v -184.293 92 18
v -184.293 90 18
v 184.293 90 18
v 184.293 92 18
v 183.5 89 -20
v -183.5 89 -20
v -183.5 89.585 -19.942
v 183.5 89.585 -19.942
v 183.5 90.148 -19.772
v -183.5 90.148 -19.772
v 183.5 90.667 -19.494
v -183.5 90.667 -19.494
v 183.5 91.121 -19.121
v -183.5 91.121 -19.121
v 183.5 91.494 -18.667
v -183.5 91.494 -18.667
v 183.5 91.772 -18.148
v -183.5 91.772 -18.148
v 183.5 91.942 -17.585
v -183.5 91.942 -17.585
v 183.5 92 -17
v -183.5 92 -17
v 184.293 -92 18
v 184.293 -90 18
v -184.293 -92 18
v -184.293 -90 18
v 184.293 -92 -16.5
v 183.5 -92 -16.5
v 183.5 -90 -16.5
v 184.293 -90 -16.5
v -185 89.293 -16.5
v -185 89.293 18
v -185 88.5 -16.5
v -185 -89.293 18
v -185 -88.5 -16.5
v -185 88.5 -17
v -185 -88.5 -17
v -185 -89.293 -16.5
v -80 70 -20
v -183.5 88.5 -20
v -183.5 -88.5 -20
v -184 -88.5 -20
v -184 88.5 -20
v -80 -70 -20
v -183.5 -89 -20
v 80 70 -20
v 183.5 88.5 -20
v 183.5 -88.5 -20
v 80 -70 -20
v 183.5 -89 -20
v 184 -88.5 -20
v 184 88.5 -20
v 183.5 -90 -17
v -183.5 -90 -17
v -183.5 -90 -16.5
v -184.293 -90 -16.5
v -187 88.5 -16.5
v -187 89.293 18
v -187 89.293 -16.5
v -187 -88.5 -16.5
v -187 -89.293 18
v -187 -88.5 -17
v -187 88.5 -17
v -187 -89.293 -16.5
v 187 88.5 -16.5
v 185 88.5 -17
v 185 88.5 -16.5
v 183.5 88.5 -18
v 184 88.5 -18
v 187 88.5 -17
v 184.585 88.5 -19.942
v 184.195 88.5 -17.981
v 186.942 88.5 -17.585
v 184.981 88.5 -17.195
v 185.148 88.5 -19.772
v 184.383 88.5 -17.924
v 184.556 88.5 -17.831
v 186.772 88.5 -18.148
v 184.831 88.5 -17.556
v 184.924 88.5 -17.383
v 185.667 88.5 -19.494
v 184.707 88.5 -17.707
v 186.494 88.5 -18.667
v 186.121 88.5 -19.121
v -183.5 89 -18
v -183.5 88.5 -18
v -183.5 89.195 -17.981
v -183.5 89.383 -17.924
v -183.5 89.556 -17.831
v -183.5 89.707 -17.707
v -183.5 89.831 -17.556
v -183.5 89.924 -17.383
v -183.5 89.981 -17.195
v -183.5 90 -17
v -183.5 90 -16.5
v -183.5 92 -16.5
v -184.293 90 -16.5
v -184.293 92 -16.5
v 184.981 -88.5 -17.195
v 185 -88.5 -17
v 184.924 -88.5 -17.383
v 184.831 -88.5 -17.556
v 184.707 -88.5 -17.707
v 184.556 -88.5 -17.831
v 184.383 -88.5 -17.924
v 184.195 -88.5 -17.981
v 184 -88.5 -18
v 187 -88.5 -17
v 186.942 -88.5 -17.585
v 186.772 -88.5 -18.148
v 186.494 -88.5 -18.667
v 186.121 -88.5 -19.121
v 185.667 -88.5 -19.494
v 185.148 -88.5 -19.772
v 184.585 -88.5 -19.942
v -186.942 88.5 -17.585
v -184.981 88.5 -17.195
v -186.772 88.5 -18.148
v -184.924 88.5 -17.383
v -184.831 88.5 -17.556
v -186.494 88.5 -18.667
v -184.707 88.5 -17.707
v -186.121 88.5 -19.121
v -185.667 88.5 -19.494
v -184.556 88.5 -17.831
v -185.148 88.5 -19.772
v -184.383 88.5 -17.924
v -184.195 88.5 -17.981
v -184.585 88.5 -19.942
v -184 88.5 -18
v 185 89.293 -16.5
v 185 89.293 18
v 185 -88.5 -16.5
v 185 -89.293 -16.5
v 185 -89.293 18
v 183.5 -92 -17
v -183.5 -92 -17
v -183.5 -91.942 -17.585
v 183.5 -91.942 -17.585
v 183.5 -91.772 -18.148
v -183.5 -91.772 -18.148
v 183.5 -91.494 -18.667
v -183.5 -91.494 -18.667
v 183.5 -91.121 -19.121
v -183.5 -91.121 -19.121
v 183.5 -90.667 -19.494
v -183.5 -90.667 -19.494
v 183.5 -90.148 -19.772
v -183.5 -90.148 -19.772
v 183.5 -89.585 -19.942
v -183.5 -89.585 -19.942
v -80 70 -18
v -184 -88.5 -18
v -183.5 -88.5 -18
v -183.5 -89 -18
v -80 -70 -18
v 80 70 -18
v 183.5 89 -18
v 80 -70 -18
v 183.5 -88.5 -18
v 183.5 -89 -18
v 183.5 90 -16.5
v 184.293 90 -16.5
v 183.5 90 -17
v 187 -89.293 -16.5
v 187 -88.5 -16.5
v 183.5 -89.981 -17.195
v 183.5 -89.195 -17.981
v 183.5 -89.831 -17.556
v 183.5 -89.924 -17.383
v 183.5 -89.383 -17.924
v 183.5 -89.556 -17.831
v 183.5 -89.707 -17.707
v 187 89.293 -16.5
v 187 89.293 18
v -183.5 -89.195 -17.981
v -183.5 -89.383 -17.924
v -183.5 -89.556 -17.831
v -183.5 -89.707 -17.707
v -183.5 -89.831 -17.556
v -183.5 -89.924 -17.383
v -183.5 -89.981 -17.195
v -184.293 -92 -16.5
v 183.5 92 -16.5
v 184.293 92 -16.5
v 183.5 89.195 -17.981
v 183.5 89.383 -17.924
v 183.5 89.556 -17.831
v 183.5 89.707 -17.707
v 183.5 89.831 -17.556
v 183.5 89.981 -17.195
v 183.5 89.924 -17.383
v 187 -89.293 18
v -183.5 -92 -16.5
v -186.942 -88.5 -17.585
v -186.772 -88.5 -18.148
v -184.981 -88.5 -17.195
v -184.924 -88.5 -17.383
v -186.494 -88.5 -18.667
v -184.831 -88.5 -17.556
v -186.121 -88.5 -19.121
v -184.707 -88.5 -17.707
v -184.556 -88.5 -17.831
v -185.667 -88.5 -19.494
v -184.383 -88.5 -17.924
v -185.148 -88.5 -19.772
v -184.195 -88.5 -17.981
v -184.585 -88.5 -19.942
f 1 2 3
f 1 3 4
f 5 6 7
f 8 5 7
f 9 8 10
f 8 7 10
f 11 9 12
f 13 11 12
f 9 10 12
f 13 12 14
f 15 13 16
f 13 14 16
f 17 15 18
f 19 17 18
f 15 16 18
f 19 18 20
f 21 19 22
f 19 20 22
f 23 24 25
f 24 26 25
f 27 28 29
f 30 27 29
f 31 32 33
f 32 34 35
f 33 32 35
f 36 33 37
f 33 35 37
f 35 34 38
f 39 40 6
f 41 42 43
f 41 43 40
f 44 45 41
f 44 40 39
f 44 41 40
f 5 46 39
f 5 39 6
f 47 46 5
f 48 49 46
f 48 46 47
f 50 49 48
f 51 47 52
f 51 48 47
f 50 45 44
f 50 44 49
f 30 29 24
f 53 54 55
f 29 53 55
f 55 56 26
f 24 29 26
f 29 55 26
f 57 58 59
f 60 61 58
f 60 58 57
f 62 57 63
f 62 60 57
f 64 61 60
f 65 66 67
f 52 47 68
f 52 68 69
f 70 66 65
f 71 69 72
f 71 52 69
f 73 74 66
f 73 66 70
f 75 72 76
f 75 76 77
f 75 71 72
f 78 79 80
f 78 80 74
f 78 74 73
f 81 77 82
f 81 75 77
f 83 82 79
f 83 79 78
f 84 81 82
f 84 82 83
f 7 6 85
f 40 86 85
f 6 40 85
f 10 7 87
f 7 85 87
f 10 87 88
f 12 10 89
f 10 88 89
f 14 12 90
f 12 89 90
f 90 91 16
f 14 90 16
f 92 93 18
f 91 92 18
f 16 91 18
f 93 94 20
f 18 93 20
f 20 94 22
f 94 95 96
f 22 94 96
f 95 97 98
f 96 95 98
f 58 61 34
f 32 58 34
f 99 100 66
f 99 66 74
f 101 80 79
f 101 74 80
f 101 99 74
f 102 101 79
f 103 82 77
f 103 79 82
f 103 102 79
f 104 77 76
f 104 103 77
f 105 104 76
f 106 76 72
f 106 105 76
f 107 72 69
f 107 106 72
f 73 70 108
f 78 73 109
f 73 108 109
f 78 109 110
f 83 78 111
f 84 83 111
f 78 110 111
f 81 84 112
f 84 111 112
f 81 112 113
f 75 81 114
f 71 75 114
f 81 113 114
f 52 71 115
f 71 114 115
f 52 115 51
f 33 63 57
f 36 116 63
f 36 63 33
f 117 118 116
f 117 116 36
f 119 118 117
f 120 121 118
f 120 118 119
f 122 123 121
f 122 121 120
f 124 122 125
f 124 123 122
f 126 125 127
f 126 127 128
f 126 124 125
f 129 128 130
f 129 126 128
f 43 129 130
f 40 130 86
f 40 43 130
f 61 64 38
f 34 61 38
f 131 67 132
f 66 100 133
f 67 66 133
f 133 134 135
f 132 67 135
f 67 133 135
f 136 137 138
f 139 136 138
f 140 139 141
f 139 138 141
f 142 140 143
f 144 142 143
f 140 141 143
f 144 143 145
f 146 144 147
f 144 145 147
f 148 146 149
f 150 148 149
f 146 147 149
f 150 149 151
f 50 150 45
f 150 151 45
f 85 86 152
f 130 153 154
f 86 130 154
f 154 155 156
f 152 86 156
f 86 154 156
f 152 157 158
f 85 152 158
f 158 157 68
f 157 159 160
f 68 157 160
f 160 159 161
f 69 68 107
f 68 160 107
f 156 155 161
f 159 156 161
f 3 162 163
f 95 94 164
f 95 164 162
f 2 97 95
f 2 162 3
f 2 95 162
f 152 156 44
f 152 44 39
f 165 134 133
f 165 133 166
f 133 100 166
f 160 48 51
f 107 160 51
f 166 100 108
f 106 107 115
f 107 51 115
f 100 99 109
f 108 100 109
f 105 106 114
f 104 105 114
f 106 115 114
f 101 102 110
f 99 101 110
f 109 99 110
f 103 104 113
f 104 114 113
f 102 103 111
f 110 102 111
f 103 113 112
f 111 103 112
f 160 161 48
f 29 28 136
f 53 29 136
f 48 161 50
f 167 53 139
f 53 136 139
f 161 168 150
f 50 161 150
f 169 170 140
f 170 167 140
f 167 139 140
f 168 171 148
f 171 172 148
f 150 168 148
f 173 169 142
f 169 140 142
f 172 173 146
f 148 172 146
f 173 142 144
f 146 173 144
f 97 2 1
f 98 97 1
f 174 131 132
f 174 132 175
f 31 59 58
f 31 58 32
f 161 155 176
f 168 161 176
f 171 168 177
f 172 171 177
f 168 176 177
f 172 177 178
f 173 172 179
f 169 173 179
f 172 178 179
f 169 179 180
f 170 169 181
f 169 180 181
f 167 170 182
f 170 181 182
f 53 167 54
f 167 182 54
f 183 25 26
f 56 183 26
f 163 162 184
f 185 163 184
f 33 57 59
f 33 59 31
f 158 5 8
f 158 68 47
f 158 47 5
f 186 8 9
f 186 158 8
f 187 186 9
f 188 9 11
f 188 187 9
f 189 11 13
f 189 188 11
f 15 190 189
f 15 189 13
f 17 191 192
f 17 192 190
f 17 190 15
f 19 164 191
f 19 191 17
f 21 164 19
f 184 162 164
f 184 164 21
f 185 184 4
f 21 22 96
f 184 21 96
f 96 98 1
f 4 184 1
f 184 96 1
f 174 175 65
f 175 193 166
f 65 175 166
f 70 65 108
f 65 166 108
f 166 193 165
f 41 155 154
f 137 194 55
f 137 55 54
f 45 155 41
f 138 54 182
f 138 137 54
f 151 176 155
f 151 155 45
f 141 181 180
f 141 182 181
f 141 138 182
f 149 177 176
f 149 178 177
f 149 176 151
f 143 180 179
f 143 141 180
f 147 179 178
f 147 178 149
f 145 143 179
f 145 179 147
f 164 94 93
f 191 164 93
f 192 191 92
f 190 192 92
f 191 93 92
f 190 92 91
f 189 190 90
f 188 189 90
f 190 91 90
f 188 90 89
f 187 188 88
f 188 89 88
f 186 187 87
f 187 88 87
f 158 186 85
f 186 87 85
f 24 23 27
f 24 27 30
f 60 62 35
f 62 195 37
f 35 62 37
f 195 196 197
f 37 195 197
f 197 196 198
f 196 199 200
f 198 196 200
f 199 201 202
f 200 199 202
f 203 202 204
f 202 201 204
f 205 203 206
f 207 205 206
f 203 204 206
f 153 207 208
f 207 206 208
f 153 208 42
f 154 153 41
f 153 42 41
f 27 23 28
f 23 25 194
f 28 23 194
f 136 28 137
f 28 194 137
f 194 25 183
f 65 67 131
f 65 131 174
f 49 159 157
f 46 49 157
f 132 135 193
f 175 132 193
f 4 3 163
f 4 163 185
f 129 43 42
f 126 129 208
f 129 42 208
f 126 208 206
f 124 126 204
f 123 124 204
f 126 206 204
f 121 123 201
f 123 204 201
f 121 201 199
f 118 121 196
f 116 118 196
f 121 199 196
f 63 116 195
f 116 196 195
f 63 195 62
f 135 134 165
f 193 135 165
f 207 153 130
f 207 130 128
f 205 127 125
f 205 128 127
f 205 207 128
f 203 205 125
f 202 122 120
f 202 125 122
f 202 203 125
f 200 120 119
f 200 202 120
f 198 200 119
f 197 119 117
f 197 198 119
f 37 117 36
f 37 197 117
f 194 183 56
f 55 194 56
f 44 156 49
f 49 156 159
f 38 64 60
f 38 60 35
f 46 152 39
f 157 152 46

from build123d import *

# Parameters (mm, degrees)
SKETCH1_W                    = 370
SKETCH1_H                    = 180
BOSS_EXTRUDE1_DEPTH          = 18
CONVERT_SOLID1_START         = -90
CONVERT_SOLID1_DEPTH         = 180
CONVERT_SOLID1_START_2       = -92
CONVERT_SOLID1_2_DEPTH       = 3.5
CONVERT_SOLID1_START_3       = 88.5
CONVERT_SOLID1_3_DEPTH       = 3.5
CONVERT_SOLID1_START_4       = -88.5
CONVERT_SOLID1_4_DEPTH       = 177
CONVERT_SOLID1_START_5       = -89
CONVERT_SOLID1_5_OUTLINE_W   = 367
CONVERT_SOLID1_5_OUTLINE_H   = 2
CONVERT_SOLID1_5_OUTLINE_W_2 = 2
CONVERT_SOLID1_5_OUTLINE_H_2 = 34.5
CONVERT_SOLID1_5_DEPTH       = 178
CONVERT_SOLID1_START_6       = -89.292893219
CONVERT_SOLID1_6_OUTLINE_W   = 2
CONVERT_SOLID1_6_OUTLINE_H   = 34.5
CONVERT_SOLID1_6_DEPTH       = 178.585786438
CONVERT_SOLID1_START_7       = -183.5
CONVERT_SOLID1_7_DEPTH       = 367
CONVERT_SOLID1_START_8       = -184.292893219
CONVERT_SOLID1_8_OUTLINE_W   = 2
CONVERT_SOLID1_8_OUTLINE_H   = 34.5
CONVERT_SOLID1_8_DEPTH       = 368.585786438
SKETCH6_W                    = 160
SKETCH6_H                    = 140
CUT_EXTRUDE1_DEPTH           = 36


with BuildPart() as part:
    # Sketch1 → Boss-Extrude1 (new, symmetric)
    with BuildSketch(Plane.XY):
        Rectangle(SKETCH1_W, SKETCH1_H)
    extrude(amount=BOSS_EXTRUDE1_DEPTH, both=True)

    # Convert-Solid1: read off the stored shape, not the designer's step
    # Convert-Solid1 outline → Convert-Solid1 (cut)
    with BuildSketch(Plane(origin=(0, 0, 0), x_dir=(1, 0, 0), z_dir=(0, 1, 0)).offset(CONVERT_SOLID1_START)):
        with BuildLine():
            ThreePointArc((-184, 18), (-184.707106781, 17.707106781), (-185, 17))
            Line((-185, 17), (-185, -18))
            Line((-185, -18), (185, -18))
            Line((185, -18), (185, 17))
            ThreePointArc((185, 17), (184.707106781, 17.707106781), (184, 18))
            Line((184, 18), (-184, 18))
        make_face()
    extrude(amount=CONVERT_SOLID1_DEPTH, mode=Mode.SUBTRACT)

    # Convert-Solid1 2 outline → Convert-Solid1 2 (cut)
    with BuildSketch(Plane(origin=(0, 0, 0), x_dir=(1, 0, 0), z_dir=(0, 1, 0)).offset(CONVERT_SOLID1_START_2)):
        with BuildLine():
            ThreePointArc((-185, 17), (-184.707106781, 17.707106781), (-184, 18))
            Line((-184, 18), (-185, 18))
            Line((-185, 18), (-185, 17))
        make_face()
        with BuildLine():
            Line((185, 18), (184, 18))
            ThreePointArc((184, 18), (184.707106781, 17.707106781), (185, 17))
            Line((185, 17), (185, 18))
        make_face()
    extrude(amount=CONVERT_SOLID1_2_DEPTH, mode=Mode.SUBTRACT)

    # Convert-Solid1 3 outline → Convert-Solid1 3 (cut)
    with BuildSketch(Plane(origin=(0, 0, 0), x_dir=(1, 0, 0), z_dir=(0, 1, 0)).offset(CONVERT_SOLID1_START_3)):
        with BuildLine():
            ThreePointArc((-185, 17), (-184.707106781, 17.707106781), (-184, 18))
            Line((-184, 18), (-185, 18))
            Line((-185, 18), (-185, 17))
        make_face()
        with BuildLine():
            Line((185, 18), (184, 18))
            ThreePointArc((184, 18), (184.707106781, 17.707106781), (185, 17))
            Line((185, 17), (185, 18))
        make_face()
    extrude(amount=CONVERT_SOLID1_3_DEPTH, mode=Mode.SUBTRACT)

    # Convert-Solid1 4 outline → Convert-Solid1 4 (add)
    with BuildSketch(Plane(origin=(0, 0, 0), x_dir=(1, 0, 0), z_dir=(0, 1, 0)).offset(CONVERT_SOLID1_START_4)):
        with BuildLine():
            Line((185, 18), (185, -18))
            Line((185, -18), (187, -18))
            Line((187, -18), (187, 17))
            ThreePointArc((187, 17), (186.121320344, 19.121320344), (184, 20))
            Line((184, 20), (-184, 20))
            ThreePointArc((-184, 20), (-186.121320344, 19.121320344), (-187, 17))
            Line((-187, 17), (-187, -18))
            Line((-187, -18), (-185, -18))
            Line((-185, -18), (-185, 18))
            Line((-185, 18), (185, 18))
        make_face()
    extrude(amount=CONVERT_SOLID1_4_DEPTH)

    # Convert-Solid1 5 outline → Convert-Solid1 5 (add)
    with BuildSketch(Plane(origin=(0, 0, 0), x_dir=(1, 0, 0), z_dir=(0, 1, 0)).offset(CONVERT_SOLID1_START_5)):
        with Locations((0, 19)):
            Rectangle(CONVERT_SOLID1_5_OUTLINE_W, CONVERT_SOLID1_5_OUTLINE_H)
        with Locations((-186, -0.75)):
            Rectangle(CONVERT_SOLID1_5_OUTLINE_W_2, CONVERT_SOLID1_5_OUTLINE_H_2)
        with Locations((186, -0.75)):
            Rectangle(CONVERT_SOLID1_5_OUTLINE_W_2, CONVERT_SOLID1_5_OUTLINE_H_2)
    extrude(amount=CONVERT_SOLID1_5_DEPTH)

    # Convert-Solid1 6 outline → Convert-Solid1 6 (add)
    with BuildSketch(Plane(origin=(0, 0, 0), x_dir=(1, 0, 0), z_dir=(0, 1, 0)).offset(CONVERT_SOLID1_START_6)):
        with Locations((-186, -0.75)):
            Rectangle(CONVERT_SOLID1_6_OUTLINE_W, CONVERT_SOLID1_6_OUTLINE_H)
        with Locations((186, -0.75)):
            Rectangle(CONVERT_SOLID1_6_OUTLINE_W, CONVERT_SOLID1_6_OUTLINE_H)
    extrude(amount=CONVERT_SOLID1_6_DEPTH)

    # Convert-Solid1 7 outline → Convert-Solid1 7 (add)
    with BuildSketch(Plane.YZ.offset(CONVERT_SOLID1_START_7)):
        with BuildLine():
            Line((92, -17), (92, 18))
            Line((92, 18), (90, 18))
            Line((90, 18), (90, -17))
            ThreePointArc((90, -17), (89.707106781, -17.707106781), (89, -18))
            Line((89, -18), (89, -20))
            ThreePointArc((89, -20), (91.121320344, -19.121320344), (92, -17))
        make_face()
        with BuildLine():
            Line((-92, 18), (-92, -17))
            ThreePointArc((-92, -17), (-91.121320344, -19.121320344), (-89, -20))
            Line((-89, -20), (-89, -18))
            ThreePointArc((-89, -18), (-89.707106781, -17.707106781), (-90, -17))
            Line((-90, -17), (-90, 18))
            Line((-90, 18), (-92, 18))
        make_face()
    extrude(amount=CONVERT_SOLID1_7_DEPTH)

    # Convert-Solid1 8 outline → Convert-Solid1 8 (add)
    with BuildSketch(Plane.YZ.offset(CONVERT_SOLID1_START_8)):
        with Locations((91, 0.75)):
            Rectangle(CONVERT_SOLID1_8_OUTLINE_W, CONVERT_SOLID1_8_OUTLINE_H)
        with Locations((-91, 0.75)):
            Rectangle(CONVERT_SOLID1_8_OUTLINE_W, CONVERT_SOLID1_8_OUTLINE_H)
    extrude(amount=CONVERT_SOLID1_8_DEPTH)

    # Sketch6 → Cut-Extrude1 (cut)
    with BuildSketch(Plane.XY.offset(-18)):
        Rectangle(SKETCH6_W, SKETCH6_H)
    extrude(amount=-CUT_EXTRUDE1_DEPTH, mode=Mode.SUBTRACT)


solid = part.part
